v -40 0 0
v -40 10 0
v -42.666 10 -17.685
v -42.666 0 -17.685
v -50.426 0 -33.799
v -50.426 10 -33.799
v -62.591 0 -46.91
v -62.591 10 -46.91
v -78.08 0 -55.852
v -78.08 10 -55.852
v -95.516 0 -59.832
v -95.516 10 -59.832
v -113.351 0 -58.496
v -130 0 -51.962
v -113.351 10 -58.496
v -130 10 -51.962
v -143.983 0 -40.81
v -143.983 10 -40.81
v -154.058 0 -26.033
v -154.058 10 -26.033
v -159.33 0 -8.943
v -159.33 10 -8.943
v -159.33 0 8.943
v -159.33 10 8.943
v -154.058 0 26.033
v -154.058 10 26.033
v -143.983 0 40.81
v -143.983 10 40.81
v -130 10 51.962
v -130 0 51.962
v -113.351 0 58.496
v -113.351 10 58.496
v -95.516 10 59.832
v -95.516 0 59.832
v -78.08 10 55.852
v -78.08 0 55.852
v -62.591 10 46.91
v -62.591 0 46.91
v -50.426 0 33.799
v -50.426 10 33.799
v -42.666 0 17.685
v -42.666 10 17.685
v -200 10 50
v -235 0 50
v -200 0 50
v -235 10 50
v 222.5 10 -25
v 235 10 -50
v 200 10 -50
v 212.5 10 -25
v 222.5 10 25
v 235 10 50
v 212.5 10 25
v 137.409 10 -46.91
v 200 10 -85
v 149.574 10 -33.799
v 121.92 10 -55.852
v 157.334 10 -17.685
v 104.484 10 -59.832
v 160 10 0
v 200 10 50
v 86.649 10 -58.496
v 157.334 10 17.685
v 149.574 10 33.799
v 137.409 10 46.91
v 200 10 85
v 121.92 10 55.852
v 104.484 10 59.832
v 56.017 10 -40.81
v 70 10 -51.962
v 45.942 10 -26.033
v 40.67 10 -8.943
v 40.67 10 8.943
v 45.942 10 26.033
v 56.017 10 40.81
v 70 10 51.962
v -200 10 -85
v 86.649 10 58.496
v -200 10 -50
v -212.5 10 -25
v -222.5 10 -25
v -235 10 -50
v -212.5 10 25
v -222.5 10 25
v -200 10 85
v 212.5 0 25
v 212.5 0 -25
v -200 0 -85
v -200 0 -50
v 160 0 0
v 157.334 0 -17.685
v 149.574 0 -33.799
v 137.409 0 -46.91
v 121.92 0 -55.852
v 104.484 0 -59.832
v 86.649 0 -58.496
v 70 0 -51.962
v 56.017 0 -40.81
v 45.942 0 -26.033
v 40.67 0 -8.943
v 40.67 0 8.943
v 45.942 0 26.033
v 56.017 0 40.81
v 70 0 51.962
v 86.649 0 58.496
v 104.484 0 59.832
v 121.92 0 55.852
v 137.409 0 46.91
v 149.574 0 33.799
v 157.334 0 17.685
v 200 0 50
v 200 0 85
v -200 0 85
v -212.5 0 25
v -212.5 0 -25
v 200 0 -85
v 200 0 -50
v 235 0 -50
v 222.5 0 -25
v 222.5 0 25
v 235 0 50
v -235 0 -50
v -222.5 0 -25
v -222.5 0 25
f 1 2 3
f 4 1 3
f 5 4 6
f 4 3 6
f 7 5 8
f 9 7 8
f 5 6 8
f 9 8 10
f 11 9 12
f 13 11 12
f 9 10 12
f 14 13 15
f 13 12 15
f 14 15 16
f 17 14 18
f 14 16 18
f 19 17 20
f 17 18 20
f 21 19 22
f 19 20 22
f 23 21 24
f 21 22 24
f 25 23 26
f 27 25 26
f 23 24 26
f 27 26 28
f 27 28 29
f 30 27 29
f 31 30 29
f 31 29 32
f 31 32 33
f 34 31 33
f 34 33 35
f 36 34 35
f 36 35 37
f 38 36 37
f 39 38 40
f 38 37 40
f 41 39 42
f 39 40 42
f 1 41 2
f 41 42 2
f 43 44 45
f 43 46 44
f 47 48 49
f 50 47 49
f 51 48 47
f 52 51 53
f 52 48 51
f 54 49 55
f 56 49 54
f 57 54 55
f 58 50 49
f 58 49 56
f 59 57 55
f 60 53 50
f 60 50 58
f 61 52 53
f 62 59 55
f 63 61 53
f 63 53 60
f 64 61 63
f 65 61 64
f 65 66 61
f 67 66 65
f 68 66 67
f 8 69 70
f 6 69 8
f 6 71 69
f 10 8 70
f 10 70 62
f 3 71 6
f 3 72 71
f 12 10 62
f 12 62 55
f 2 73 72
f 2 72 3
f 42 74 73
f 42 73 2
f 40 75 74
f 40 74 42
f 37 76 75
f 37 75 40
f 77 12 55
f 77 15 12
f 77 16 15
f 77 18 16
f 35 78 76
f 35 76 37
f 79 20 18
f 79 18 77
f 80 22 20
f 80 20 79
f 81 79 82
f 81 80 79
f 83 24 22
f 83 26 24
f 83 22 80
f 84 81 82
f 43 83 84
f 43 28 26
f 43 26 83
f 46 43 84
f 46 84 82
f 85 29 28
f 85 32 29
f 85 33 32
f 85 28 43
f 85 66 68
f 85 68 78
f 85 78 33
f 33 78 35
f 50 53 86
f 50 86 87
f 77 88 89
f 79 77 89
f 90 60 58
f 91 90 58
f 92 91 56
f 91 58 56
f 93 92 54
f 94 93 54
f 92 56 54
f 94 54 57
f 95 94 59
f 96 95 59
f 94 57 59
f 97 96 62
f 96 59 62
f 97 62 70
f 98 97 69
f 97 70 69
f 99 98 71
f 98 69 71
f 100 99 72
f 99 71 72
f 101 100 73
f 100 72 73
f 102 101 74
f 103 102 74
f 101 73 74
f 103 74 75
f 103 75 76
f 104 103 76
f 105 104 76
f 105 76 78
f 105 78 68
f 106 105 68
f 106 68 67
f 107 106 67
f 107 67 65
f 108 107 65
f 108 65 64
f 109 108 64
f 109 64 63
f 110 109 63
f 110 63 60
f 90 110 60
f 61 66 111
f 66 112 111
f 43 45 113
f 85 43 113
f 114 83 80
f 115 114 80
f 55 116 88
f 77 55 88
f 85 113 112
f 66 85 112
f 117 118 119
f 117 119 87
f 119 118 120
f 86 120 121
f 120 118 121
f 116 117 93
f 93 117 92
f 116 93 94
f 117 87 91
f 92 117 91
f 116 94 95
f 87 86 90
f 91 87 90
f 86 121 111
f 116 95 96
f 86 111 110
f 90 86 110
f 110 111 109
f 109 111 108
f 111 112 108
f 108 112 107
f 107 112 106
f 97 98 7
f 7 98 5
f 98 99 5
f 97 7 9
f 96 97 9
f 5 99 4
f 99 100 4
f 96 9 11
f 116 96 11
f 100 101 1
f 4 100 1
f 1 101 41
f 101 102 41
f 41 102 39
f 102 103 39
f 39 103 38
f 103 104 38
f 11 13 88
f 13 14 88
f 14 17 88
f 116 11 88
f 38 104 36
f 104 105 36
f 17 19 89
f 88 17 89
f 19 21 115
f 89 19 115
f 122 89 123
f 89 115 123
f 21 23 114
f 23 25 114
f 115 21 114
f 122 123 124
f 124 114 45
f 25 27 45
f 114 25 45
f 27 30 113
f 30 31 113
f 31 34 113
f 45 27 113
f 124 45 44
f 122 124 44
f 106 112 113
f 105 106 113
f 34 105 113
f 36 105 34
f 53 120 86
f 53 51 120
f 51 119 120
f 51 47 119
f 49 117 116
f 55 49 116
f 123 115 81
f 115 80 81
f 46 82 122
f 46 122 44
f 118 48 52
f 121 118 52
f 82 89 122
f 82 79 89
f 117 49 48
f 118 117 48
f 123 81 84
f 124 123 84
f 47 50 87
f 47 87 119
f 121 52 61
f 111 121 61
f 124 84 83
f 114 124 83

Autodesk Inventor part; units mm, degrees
ref_plane "YZ Plane" through (0, 0, 0) normal (1, 0, 0) x (0, 1, 0)
ref_plane "XZ Plane" through (0, 0, 0) normal (0, 1, 0) x (-1, 0, 0)
ref_plane "XY Plane" through (0, 0, 0) normal (0, 0, 1) x (1, 0, 0)
sketch "Boceto1" plane through (0, 0, 0) normal (0, 1, 0) x (-1, 0, 0)
  line L0 (200, 85) -> (-200, 85)
  line L1 (-200, 85) -> (-200, -85)
  line L2 (-200, -85) -> (200, -85)
  line L3 (200, -85) -> (200, 85)
  line L4 (200, 85) -> (-200, -85) construction
  line L5 (-200, 85) -> (200, -85) construction
  point P0 (0, 0)
  dimension "d0" = 400
  dimension "d1" = 170
extrude "Extrusión1" add sketch "Boceto1" along normal blind 10
sketch "Boceto2" plane through (0, 10, 0) normal (0, 1, 0) x (1, 0, 0)
  line L0 (0, 0) -> (-100, 0)
  line L1 (0, 0) -> (100, 0) construction
  circle A0 centre (-100, 0) radius 60
  line L2 (0, 0) -> (0, 85)
  line L3 (200, 85) -> (-200, 85) projected
  circle A1 centre (100, 0) radius 60
  dimension "d5" = 100
  dimension "d6" = 180
  dimension "d7" = 120
extrude "Extrusión2" cut sketch "Boceto2" against normal up to surface (10 mm away)
sketch "Boceto3" plane through (0, 10, 0) normal (0, 1, 0) x (1, 0, 0)
  line L0 (165, 50) -> (235, 50)
  line L1 (235, 50) -> (235, -50)
  line L2 (235, -50) -> (165, -50)
  line L3 (165, -50) -> (165, 50)
  line L4 (200, -85) -> (200, 85) projected
  line L5 (165, 50) -> (235, -50) construction
  line L6 (235, 50) -> (165, -50) construction
  line L7 (200, 50) -> (200, -50)
  line L8 (0, -85) -> (0, 85)
  line L9 (200, 85) -> (-200, 85) projected
  line L10 (-165, 50) -> (-235, 50)
  line L11 (-235, 50) -> (-235, -50)
  line L12 (-235, -50) -> (-165, -50)
  line L13 (-200, -85) -> (-200, 85)
  point P0 (0, 0)
  point P1 (200, 0)
  point P2 (-200, -50)
  point P3 (-200, 50)
  dimension "d10" = 70
  dimension "d11" = 100
extrude "Extrusión3" add sketch "Boceto3" against normal up to surface (10 mm away) contours L13 L12 L11 L10 | L0 L1 L2 L4
sketch "Boceto4" plane through (0, 10, 0) normal (0, 1, 0) x (1, 0, 0)
  line L0 (0, 0) -> (0, 85)
  line L1 (200, 85) -> (-200, 85) projected
  line L2 (-235, 50) -> (-235, -50) projected
  line L3 (-235, 0) -> (-217.5, 0)
  line L4 (-235, 0) -> (-217.5, 0) construction
  line L5 (-222.5, -25) -> (-212.5, -25)
  line L6 (-212.5, -25) -> (-212.5, 25)
  line L7 (-212.5, 25) -> (-222.5, 25)
  line L8 (-222.5, 25) -> (-222.5, -25)
  line L9 (-222.5, -25) -> (-212.5, 25) construction
  line L10 (-212.5, -25) -> (-222.5, 25) construction
  line L11 (222.5, -25) -> (212.5, -25)
  line L12 (212.5, -25) -> (212.5, 25)
  line L13 (212.5, 25) -> (222.5, 25)
  line L14 (222.5, 25) -> (222.5, -25)
  dimension "d14" = 17.5
  dimension "d15" = 0
  dimension "d16" = 10
  dimension "d17" = 50
extrude "Extrusión4" cut sketch "Boceto4" against normal up to surface (10 mm away)
equation "\"d0\" = largo_c"
equation "\"d1\" = ancho_c"
equation "\"d2\" = grueso"
equation "\"d5\" = d_plato"
equation "\"d7\" = diametro_c"
equation "\"d10\" = largo_p"
equation "\"d11\" = ancho_p"
equation "\"d14\" = 0.25 * largo_p"
equation "\"d16\" = ancho_a"
equation "\"d17\" = alto_a"
equation "\"ancho_c\" = 170"
equation "\"largo_c\" = 400"
equation "\"grueso\" = 10"
equation "\"diametro_c\" = 120"
equation "\"d_plato\" = 100"
equation "\"ancho_p\" = 100"
equation "\"largo_p\" = 70"
equation "\"ancho_a\" = 10"
equation "\"alto_a\" = 50"
properties part number "Parte C" material "Madera (abedul)"
